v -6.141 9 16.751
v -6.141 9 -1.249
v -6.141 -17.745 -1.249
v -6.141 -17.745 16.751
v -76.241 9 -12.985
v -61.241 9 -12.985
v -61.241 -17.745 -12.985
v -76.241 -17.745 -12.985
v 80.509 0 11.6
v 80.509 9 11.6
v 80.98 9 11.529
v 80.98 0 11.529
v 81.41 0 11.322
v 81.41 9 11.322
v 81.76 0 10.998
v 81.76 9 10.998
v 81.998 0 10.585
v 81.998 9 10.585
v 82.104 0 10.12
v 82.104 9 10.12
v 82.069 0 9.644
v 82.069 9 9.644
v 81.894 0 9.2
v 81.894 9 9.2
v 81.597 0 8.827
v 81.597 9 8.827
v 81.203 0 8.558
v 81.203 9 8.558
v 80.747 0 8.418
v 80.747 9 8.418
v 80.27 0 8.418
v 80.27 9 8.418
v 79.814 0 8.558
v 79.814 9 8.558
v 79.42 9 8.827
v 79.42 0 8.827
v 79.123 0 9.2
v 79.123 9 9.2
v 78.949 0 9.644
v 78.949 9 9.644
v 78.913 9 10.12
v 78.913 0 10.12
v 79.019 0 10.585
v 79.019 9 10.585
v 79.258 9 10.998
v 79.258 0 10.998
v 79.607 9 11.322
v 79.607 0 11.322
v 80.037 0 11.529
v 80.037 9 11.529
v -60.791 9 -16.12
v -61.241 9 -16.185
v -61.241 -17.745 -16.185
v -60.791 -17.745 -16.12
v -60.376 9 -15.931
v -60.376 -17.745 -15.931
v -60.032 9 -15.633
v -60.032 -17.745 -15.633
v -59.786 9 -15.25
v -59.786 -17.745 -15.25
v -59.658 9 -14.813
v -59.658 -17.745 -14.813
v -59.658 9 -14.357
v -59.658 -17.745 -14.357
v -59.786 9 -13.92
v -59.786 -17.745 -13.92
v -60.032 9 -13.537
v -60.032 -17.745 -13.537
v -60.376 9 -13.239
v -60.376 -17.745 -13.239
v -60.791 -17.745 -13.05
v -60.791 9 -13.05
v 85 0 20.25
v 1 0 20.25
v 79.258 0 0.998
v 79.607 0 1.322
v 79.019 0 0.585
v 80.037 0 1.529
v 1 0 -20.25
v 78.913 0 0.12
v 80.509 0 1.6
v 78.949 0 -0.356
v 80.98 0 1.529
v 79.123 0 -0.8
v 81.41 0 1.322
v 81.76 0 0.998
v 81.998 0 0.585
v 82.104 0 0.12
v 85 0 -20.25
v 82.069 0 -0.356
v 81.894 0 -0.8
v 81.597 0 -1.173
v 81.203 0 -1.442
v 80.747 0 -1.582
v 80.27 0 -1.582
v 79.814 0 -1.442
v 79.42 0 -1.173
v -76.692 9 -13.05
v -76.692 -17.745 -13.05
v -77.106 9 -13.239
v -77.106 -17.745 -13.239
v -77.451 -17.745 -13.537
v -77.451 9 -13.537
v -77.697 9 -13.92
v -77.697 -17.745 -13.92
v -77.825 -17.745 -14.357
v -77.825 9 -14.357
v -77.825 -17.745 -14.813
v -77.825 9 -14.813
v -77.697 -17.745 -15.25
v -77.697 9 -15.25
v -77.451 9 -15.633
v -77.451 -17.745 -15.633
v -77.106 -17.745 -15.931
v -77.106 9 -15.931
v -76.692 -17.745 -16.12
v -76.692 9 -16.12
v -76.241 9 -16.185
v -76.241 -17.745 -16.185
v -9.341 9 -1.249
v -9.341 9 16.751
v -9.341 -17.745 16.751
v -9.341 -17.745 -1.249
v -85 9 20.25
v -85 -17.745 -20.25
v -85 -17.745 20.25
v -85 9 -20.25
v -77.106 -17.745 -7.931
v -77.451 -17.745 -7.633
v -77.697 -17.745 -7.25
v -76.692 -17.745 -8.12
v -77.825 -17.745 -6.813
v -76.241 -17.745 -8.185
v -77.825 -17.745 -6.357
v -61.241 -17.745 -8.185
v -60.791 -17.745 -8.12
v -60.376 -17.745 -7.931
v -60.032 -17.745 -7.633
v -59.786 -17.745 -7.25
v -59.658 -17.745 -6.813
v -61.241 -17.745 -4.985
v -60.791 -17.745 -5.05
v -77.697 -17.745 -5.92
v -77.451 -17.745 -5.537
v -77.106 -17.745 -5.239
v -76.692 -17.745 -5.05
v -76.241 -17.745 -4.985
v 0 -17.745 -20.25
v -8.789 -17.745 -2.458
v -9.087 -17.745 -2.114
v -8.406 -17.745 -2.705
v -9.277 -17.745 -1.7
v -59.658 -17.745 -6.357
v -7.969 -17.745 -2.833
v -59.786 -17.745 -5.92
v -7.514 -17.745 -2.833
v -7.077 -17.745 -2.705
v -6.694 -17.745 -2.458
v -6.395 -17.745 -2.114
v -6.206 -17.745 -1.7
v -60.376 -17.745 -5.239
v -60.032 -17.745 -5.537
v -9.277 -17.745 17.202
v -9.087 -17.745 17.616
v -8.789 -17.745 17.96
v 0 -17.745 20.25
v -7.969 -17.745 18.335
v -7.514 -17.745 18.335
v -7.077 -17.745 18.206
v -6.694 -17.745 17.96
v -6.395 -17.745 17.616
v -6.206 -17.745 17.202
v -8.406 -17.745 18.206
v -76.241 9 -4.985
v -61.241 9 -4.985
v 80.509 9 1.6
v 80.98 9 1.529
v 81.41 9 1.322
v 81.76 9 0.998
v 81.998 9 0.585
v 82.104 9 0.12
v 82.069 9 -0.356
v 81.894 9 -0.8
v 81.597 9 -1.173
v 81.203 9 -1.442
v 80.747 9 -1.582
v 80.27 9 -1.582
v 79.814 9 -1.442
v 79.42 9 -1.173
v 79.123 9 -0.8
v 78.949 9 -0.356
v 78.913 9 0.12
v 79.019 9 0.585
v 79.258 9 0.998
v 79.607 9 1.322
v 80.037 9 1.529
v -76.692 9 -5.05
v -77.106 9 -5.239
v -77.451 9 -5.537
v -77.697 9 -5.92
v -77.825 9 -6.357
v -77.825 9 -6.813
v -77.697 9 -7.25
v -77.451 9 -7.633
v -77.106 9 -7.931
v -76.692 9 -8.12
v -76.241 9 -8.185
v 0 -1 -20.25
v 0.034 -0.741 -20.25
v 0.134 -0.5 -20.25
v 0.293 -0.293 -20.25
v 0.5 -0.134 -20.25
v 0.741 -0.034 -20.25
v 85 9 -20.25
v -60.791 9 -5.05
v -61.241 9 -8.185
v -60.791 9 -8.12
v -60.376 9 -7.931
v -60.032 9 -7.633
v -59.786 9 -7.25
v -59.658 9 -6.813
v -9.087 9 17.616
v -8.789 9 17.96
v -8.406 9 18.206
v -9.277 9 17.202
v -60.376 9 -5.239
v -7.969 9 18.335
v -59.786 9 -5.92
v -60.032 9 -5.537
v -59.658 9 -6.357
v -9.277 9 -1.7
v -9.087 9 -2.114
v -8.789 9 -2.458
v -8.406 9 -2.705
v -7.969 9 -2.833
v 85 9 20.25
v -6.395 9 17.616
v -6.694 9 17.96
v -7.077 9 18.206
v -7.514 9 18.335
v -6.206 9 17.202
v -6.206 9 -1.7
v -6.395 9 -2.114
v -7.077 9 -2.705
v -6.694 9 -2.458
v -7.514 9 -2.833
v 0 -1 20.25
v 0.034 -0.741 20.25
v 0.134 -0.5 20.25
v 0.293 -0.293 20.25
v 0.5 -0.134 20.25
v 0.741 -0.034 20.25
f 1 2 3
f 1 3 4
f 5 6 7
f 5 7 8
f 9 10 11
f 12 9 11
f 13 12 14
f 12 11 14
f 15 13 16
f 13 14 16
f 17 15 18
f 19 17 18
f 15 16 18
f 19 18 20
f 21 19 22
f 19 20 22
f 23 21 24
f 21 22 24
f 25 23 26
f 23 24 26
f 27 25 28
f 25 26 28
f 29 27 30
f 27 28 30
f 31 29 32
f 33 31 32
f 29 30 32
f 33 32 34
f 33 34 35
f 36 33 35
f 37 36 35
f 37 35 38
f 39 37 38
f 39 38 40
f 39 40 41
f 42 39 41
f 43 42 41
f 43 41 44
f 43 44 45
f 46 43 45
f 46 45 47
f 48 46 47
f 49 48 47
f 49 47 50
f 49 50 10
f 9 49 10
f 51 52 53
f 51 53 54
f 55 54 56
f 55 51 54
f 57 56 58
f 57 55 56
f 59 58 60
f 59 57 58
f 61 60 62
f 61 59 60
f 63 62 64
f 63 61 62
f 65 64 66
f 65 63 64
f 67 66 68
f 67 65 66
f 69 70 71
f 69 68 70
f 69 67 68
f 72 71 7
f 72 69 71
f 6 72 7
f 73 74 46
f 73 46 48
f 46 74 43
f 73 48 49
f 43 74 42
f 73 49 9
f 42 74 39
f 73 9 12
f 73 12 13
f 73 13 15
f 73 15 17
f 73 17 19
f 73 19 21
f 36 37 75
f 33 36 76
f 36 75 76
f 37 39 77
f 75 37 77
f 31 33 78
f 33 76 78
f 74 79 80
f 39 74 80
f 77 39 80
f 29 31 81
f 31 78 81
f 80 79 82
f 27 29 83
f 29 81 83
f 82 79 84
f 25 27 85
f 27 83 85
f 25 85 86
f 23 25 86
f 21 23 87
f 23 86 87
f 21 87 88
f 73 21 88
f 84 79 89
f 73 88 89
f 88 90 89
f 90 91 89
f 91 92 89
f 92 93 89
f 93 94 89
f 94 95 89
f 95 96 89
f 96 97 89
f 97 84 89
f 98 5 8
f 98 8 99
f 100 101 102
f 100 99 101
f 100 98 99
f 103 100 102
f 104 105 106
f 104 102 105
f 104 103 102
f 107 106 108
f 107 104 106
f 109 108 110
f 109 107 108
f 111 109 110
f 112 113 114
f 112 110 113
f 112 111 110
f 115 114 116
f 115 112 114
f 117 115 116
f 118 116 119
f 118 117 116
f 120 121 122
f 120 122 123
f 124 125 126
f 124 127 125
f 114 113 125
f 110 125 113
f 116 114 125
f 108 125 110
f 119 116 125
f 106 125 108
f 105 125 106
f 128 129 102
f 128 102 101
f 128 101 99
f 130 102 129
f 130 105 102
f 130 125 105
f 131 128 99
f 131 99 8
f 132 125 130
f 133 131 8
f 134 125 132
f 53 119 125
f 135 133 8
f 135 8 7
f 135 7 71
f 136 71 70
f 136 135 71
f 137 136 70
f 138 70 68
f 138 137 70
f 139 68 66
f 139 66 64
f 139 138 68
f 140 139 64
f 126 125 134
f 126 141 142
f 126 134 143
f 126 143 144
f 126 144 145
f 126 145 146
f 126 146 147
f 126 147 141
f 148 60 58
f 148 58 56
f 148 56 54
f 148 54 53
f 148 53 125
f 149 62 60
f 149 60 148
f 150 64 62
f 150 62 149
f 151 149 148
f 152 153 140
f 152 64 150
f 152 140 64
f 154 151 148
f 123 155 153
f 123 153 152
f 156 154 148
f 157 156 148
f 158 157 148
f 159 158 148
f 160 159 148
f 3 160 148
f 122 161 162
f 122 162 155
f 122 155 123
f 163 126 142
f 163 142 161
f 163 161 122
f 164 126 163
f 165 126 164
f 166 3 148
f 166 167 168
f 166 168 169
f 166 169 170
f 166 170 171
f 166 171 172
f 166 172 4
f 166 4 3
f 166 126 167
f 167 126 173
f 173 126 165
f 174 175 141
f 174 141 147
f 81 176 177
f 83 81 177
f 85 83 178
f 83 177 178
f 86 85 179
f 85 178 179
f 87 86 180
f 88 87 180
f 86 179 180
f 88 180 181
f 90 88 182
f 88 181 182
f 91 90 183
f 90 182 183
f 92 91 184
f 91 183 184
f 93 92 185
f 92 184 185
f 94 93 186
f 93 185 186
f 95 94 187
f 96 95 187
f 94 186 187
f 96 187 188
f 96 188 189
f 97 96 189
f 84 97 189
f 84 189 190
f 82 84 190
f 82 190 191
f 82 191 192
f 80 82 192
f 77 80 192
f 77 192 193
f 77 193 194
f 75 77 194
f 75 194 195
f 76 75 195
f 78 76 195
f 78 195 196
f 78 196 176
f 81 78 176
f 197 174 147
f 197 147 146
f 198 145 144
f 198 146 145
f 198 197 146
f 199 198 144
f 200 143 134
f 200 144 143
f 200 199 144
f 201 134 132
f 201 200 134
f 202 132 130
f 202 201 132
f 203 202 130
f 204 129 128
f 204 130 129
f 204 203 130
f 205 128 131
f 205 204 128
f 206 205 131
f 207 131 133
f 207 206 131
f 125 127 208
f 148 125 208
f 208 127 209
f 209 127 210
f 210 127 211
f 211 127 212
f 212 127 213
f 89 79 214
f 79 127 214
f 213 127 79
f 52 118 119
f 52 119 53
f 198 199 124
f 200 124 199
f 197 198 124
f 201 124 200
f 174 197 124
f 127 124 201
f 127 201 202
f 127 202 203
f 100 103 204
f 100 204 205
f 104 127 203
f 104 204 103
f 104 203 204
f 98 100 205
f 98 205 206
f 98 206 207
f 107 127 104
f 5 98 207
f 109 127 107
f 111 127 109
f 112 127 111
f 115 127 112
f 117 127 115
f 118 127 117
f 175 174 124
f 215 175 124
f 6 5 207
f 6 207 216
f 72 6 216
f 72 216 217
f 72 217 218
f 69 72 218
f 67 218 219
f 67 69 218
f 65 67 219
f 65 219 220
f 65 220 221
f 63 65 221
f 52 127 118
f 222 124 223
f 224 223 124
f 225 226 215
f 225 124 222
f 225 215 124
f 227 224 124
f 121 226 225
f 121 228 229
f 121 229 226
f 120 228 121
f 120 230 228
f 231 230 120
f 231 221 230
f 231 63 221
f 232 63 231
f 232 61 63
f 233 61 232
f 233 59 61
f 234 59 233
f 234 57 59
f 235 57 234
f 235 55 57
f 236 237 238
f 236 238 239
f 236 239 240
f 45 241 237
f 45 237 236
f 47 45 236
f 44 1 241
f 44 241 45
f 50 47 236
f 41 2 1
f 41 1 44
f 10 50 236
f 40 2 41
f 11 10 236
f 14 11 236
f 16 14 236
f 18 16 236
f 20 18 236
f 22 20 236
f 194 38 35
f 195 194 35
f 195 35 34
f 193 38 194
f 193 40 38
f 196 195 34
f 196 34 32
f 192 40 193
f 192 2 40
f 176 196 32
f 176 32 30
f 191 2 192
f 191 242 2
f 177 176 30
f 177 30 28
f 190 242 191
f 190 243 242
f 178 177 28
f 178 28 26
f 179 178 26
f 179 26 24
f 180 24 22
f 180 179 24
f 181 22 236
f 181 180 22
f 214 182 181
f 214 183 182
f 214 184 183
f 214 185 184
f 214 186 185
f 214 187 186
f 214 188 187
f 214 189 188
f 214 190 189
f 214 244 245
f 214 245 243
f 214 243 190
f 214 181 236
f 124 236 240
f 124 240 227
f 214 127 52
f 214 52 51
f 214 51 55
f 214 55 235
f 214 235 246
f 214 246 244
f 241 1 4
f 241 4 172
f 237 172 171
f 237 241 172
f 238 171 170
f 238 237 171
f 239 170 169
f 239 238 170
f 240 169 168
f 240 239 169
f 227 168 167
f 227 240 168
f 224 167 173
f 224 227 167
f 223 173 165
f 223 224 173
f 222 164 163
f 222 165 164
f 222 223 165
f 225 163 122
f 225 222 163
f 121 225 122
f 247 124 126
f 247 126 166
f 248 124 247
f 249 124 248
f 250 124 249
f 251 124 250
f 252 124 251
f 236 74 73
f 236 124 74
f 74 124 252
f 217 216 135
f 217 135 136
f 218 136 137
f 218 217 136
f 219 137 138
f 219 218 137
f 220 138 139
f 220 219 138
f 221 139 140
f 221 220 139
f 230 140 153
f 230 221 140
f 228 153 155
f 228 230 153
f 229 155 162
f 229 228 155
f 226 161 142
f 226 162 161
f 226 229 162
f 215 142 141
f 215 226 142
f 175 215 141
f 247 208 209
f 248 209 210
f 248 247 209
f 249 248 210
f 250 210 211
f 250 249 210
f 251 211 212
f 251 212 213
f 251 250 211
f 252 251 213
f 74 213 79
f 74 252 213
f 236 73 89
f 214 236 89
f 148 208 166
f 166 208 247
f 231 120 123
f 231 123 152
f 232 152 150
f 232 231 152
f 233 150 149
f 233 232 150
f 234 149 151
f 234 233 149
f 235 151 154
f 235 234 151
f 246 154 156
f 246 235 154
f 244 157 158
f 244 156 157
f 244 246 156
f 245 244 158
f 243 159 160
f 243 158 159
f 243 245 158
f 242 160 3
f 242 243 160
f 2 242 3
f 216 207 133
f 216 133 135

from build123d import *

# Parameters (mm, degrees)
SKETCH1_W           = 170
SKETCH1_H           = 40.5
BOSS_EXTRUDE1_DEPTH = 9
SKETCH2_W           = 85
SKETCH2_H           = 40.5
BOSS_EXTRUDE2_DEPTH = 17.745
SKETCH3_R           = 1.6
CUT_EXTRUDE1_DEPTH  = 92.380290681
FILLET1_R           = 1


with BuildPart() as part:
    # Sketch1 → Boss-Extrude1 (new body)
    with BuildSketch(Plane(origin=(0, 0, 0), x_dir=(1, 0, 0), z_dir=(0, 1, 0))):
        Rectangle(SKETCH1_W, SKETCH1_H)
    extrude(amount=BOSS_EXTRUDE1_DEPTH)

    # Sketch2 → Boss-Extrude2 (add)
    with BuildSketch(Plane.XZ):
        with Locations((-42.5, 0)):
            Rectangle(SKETCH2_W, SKETCH2_H)
    extrude(amount=BOSS_EXTRUDE2_DEPTH)

    # Sketch3 → Cut-Extrude1 (cut, through all)
    with BuildSketch(Plane(origin=(0, 9, 0), x_dir=(1, 0, 0), z_dir=(0, 1, 0))):
        with Locations(Location((80.508679868, 0, 0), (0, 0, 270))):
            Circle(SKETCH3_R)
        with Locations(Location((80.508679868, -10, 0), (0, 0, 270))):
            Circle(SKETCH3_R)
        with BuildLine():
            Line((-76.241320132, 8.185093605), (-61.241320132, 8.185093605))
            ThreePointArc((-61.241320132, 8.185093605), (-59.641320132, 6.585093605), (-61.241320132, 4.985093605))
            Line((-61.241320132, 4.985093605), (-76.241320132, 4.985093605))
            ThreePointArc((-76.241320132, 4.985093605), (-77.841320132, 6.585093605), (-76.241320132, 8.185093605))
        make_face()
        with BuildLine():
            Line((-61.241320132, 12.985093605), (-76.241320132, 12.985093605))
            ThreePointArc((-76.241320132, 12.985093605), (-77.841320132, 14.585093605), (-76.241320132, 16.185093605))
            Line((-76.241320132, 16.185093605), (-61.241320132, 16.185093605))
            ThreePointArc((-61.241320132, 16.185093605), (-59.641320132, 14.585093605), (-61.241320132, 12.985093605))
        make_face()
        with BuildLine():
            Line((-6.141320132, 1.249202664), (-6.141320132, -16.750797336))
            ThreePointArc((-6.141320132, -16.750797336), (-7.741320132, -18.350797336), (-9.341320132, -16.750797336))
            Line((-9.341320132, -16.750797336), (-9.341320132, 1.249202664))
            ThreePointArc((-9.341320132, 1.249202664), (-7.741320132, 2.849202664), (-6.141320132, 1.249202664))
        make_face()
    extrude(amount=-CUT_EXTRUDE1_DEPTH, mode=Mode.SUBTRACT)

    # Fillet1
    fillet1_edges = [part.edges().sort_by_distance(p)[0] for p in [
        (0, 0, 0),
    ]]
    fillet(fillet1_edges, radius=FILLET1_R)


solid = part.part
